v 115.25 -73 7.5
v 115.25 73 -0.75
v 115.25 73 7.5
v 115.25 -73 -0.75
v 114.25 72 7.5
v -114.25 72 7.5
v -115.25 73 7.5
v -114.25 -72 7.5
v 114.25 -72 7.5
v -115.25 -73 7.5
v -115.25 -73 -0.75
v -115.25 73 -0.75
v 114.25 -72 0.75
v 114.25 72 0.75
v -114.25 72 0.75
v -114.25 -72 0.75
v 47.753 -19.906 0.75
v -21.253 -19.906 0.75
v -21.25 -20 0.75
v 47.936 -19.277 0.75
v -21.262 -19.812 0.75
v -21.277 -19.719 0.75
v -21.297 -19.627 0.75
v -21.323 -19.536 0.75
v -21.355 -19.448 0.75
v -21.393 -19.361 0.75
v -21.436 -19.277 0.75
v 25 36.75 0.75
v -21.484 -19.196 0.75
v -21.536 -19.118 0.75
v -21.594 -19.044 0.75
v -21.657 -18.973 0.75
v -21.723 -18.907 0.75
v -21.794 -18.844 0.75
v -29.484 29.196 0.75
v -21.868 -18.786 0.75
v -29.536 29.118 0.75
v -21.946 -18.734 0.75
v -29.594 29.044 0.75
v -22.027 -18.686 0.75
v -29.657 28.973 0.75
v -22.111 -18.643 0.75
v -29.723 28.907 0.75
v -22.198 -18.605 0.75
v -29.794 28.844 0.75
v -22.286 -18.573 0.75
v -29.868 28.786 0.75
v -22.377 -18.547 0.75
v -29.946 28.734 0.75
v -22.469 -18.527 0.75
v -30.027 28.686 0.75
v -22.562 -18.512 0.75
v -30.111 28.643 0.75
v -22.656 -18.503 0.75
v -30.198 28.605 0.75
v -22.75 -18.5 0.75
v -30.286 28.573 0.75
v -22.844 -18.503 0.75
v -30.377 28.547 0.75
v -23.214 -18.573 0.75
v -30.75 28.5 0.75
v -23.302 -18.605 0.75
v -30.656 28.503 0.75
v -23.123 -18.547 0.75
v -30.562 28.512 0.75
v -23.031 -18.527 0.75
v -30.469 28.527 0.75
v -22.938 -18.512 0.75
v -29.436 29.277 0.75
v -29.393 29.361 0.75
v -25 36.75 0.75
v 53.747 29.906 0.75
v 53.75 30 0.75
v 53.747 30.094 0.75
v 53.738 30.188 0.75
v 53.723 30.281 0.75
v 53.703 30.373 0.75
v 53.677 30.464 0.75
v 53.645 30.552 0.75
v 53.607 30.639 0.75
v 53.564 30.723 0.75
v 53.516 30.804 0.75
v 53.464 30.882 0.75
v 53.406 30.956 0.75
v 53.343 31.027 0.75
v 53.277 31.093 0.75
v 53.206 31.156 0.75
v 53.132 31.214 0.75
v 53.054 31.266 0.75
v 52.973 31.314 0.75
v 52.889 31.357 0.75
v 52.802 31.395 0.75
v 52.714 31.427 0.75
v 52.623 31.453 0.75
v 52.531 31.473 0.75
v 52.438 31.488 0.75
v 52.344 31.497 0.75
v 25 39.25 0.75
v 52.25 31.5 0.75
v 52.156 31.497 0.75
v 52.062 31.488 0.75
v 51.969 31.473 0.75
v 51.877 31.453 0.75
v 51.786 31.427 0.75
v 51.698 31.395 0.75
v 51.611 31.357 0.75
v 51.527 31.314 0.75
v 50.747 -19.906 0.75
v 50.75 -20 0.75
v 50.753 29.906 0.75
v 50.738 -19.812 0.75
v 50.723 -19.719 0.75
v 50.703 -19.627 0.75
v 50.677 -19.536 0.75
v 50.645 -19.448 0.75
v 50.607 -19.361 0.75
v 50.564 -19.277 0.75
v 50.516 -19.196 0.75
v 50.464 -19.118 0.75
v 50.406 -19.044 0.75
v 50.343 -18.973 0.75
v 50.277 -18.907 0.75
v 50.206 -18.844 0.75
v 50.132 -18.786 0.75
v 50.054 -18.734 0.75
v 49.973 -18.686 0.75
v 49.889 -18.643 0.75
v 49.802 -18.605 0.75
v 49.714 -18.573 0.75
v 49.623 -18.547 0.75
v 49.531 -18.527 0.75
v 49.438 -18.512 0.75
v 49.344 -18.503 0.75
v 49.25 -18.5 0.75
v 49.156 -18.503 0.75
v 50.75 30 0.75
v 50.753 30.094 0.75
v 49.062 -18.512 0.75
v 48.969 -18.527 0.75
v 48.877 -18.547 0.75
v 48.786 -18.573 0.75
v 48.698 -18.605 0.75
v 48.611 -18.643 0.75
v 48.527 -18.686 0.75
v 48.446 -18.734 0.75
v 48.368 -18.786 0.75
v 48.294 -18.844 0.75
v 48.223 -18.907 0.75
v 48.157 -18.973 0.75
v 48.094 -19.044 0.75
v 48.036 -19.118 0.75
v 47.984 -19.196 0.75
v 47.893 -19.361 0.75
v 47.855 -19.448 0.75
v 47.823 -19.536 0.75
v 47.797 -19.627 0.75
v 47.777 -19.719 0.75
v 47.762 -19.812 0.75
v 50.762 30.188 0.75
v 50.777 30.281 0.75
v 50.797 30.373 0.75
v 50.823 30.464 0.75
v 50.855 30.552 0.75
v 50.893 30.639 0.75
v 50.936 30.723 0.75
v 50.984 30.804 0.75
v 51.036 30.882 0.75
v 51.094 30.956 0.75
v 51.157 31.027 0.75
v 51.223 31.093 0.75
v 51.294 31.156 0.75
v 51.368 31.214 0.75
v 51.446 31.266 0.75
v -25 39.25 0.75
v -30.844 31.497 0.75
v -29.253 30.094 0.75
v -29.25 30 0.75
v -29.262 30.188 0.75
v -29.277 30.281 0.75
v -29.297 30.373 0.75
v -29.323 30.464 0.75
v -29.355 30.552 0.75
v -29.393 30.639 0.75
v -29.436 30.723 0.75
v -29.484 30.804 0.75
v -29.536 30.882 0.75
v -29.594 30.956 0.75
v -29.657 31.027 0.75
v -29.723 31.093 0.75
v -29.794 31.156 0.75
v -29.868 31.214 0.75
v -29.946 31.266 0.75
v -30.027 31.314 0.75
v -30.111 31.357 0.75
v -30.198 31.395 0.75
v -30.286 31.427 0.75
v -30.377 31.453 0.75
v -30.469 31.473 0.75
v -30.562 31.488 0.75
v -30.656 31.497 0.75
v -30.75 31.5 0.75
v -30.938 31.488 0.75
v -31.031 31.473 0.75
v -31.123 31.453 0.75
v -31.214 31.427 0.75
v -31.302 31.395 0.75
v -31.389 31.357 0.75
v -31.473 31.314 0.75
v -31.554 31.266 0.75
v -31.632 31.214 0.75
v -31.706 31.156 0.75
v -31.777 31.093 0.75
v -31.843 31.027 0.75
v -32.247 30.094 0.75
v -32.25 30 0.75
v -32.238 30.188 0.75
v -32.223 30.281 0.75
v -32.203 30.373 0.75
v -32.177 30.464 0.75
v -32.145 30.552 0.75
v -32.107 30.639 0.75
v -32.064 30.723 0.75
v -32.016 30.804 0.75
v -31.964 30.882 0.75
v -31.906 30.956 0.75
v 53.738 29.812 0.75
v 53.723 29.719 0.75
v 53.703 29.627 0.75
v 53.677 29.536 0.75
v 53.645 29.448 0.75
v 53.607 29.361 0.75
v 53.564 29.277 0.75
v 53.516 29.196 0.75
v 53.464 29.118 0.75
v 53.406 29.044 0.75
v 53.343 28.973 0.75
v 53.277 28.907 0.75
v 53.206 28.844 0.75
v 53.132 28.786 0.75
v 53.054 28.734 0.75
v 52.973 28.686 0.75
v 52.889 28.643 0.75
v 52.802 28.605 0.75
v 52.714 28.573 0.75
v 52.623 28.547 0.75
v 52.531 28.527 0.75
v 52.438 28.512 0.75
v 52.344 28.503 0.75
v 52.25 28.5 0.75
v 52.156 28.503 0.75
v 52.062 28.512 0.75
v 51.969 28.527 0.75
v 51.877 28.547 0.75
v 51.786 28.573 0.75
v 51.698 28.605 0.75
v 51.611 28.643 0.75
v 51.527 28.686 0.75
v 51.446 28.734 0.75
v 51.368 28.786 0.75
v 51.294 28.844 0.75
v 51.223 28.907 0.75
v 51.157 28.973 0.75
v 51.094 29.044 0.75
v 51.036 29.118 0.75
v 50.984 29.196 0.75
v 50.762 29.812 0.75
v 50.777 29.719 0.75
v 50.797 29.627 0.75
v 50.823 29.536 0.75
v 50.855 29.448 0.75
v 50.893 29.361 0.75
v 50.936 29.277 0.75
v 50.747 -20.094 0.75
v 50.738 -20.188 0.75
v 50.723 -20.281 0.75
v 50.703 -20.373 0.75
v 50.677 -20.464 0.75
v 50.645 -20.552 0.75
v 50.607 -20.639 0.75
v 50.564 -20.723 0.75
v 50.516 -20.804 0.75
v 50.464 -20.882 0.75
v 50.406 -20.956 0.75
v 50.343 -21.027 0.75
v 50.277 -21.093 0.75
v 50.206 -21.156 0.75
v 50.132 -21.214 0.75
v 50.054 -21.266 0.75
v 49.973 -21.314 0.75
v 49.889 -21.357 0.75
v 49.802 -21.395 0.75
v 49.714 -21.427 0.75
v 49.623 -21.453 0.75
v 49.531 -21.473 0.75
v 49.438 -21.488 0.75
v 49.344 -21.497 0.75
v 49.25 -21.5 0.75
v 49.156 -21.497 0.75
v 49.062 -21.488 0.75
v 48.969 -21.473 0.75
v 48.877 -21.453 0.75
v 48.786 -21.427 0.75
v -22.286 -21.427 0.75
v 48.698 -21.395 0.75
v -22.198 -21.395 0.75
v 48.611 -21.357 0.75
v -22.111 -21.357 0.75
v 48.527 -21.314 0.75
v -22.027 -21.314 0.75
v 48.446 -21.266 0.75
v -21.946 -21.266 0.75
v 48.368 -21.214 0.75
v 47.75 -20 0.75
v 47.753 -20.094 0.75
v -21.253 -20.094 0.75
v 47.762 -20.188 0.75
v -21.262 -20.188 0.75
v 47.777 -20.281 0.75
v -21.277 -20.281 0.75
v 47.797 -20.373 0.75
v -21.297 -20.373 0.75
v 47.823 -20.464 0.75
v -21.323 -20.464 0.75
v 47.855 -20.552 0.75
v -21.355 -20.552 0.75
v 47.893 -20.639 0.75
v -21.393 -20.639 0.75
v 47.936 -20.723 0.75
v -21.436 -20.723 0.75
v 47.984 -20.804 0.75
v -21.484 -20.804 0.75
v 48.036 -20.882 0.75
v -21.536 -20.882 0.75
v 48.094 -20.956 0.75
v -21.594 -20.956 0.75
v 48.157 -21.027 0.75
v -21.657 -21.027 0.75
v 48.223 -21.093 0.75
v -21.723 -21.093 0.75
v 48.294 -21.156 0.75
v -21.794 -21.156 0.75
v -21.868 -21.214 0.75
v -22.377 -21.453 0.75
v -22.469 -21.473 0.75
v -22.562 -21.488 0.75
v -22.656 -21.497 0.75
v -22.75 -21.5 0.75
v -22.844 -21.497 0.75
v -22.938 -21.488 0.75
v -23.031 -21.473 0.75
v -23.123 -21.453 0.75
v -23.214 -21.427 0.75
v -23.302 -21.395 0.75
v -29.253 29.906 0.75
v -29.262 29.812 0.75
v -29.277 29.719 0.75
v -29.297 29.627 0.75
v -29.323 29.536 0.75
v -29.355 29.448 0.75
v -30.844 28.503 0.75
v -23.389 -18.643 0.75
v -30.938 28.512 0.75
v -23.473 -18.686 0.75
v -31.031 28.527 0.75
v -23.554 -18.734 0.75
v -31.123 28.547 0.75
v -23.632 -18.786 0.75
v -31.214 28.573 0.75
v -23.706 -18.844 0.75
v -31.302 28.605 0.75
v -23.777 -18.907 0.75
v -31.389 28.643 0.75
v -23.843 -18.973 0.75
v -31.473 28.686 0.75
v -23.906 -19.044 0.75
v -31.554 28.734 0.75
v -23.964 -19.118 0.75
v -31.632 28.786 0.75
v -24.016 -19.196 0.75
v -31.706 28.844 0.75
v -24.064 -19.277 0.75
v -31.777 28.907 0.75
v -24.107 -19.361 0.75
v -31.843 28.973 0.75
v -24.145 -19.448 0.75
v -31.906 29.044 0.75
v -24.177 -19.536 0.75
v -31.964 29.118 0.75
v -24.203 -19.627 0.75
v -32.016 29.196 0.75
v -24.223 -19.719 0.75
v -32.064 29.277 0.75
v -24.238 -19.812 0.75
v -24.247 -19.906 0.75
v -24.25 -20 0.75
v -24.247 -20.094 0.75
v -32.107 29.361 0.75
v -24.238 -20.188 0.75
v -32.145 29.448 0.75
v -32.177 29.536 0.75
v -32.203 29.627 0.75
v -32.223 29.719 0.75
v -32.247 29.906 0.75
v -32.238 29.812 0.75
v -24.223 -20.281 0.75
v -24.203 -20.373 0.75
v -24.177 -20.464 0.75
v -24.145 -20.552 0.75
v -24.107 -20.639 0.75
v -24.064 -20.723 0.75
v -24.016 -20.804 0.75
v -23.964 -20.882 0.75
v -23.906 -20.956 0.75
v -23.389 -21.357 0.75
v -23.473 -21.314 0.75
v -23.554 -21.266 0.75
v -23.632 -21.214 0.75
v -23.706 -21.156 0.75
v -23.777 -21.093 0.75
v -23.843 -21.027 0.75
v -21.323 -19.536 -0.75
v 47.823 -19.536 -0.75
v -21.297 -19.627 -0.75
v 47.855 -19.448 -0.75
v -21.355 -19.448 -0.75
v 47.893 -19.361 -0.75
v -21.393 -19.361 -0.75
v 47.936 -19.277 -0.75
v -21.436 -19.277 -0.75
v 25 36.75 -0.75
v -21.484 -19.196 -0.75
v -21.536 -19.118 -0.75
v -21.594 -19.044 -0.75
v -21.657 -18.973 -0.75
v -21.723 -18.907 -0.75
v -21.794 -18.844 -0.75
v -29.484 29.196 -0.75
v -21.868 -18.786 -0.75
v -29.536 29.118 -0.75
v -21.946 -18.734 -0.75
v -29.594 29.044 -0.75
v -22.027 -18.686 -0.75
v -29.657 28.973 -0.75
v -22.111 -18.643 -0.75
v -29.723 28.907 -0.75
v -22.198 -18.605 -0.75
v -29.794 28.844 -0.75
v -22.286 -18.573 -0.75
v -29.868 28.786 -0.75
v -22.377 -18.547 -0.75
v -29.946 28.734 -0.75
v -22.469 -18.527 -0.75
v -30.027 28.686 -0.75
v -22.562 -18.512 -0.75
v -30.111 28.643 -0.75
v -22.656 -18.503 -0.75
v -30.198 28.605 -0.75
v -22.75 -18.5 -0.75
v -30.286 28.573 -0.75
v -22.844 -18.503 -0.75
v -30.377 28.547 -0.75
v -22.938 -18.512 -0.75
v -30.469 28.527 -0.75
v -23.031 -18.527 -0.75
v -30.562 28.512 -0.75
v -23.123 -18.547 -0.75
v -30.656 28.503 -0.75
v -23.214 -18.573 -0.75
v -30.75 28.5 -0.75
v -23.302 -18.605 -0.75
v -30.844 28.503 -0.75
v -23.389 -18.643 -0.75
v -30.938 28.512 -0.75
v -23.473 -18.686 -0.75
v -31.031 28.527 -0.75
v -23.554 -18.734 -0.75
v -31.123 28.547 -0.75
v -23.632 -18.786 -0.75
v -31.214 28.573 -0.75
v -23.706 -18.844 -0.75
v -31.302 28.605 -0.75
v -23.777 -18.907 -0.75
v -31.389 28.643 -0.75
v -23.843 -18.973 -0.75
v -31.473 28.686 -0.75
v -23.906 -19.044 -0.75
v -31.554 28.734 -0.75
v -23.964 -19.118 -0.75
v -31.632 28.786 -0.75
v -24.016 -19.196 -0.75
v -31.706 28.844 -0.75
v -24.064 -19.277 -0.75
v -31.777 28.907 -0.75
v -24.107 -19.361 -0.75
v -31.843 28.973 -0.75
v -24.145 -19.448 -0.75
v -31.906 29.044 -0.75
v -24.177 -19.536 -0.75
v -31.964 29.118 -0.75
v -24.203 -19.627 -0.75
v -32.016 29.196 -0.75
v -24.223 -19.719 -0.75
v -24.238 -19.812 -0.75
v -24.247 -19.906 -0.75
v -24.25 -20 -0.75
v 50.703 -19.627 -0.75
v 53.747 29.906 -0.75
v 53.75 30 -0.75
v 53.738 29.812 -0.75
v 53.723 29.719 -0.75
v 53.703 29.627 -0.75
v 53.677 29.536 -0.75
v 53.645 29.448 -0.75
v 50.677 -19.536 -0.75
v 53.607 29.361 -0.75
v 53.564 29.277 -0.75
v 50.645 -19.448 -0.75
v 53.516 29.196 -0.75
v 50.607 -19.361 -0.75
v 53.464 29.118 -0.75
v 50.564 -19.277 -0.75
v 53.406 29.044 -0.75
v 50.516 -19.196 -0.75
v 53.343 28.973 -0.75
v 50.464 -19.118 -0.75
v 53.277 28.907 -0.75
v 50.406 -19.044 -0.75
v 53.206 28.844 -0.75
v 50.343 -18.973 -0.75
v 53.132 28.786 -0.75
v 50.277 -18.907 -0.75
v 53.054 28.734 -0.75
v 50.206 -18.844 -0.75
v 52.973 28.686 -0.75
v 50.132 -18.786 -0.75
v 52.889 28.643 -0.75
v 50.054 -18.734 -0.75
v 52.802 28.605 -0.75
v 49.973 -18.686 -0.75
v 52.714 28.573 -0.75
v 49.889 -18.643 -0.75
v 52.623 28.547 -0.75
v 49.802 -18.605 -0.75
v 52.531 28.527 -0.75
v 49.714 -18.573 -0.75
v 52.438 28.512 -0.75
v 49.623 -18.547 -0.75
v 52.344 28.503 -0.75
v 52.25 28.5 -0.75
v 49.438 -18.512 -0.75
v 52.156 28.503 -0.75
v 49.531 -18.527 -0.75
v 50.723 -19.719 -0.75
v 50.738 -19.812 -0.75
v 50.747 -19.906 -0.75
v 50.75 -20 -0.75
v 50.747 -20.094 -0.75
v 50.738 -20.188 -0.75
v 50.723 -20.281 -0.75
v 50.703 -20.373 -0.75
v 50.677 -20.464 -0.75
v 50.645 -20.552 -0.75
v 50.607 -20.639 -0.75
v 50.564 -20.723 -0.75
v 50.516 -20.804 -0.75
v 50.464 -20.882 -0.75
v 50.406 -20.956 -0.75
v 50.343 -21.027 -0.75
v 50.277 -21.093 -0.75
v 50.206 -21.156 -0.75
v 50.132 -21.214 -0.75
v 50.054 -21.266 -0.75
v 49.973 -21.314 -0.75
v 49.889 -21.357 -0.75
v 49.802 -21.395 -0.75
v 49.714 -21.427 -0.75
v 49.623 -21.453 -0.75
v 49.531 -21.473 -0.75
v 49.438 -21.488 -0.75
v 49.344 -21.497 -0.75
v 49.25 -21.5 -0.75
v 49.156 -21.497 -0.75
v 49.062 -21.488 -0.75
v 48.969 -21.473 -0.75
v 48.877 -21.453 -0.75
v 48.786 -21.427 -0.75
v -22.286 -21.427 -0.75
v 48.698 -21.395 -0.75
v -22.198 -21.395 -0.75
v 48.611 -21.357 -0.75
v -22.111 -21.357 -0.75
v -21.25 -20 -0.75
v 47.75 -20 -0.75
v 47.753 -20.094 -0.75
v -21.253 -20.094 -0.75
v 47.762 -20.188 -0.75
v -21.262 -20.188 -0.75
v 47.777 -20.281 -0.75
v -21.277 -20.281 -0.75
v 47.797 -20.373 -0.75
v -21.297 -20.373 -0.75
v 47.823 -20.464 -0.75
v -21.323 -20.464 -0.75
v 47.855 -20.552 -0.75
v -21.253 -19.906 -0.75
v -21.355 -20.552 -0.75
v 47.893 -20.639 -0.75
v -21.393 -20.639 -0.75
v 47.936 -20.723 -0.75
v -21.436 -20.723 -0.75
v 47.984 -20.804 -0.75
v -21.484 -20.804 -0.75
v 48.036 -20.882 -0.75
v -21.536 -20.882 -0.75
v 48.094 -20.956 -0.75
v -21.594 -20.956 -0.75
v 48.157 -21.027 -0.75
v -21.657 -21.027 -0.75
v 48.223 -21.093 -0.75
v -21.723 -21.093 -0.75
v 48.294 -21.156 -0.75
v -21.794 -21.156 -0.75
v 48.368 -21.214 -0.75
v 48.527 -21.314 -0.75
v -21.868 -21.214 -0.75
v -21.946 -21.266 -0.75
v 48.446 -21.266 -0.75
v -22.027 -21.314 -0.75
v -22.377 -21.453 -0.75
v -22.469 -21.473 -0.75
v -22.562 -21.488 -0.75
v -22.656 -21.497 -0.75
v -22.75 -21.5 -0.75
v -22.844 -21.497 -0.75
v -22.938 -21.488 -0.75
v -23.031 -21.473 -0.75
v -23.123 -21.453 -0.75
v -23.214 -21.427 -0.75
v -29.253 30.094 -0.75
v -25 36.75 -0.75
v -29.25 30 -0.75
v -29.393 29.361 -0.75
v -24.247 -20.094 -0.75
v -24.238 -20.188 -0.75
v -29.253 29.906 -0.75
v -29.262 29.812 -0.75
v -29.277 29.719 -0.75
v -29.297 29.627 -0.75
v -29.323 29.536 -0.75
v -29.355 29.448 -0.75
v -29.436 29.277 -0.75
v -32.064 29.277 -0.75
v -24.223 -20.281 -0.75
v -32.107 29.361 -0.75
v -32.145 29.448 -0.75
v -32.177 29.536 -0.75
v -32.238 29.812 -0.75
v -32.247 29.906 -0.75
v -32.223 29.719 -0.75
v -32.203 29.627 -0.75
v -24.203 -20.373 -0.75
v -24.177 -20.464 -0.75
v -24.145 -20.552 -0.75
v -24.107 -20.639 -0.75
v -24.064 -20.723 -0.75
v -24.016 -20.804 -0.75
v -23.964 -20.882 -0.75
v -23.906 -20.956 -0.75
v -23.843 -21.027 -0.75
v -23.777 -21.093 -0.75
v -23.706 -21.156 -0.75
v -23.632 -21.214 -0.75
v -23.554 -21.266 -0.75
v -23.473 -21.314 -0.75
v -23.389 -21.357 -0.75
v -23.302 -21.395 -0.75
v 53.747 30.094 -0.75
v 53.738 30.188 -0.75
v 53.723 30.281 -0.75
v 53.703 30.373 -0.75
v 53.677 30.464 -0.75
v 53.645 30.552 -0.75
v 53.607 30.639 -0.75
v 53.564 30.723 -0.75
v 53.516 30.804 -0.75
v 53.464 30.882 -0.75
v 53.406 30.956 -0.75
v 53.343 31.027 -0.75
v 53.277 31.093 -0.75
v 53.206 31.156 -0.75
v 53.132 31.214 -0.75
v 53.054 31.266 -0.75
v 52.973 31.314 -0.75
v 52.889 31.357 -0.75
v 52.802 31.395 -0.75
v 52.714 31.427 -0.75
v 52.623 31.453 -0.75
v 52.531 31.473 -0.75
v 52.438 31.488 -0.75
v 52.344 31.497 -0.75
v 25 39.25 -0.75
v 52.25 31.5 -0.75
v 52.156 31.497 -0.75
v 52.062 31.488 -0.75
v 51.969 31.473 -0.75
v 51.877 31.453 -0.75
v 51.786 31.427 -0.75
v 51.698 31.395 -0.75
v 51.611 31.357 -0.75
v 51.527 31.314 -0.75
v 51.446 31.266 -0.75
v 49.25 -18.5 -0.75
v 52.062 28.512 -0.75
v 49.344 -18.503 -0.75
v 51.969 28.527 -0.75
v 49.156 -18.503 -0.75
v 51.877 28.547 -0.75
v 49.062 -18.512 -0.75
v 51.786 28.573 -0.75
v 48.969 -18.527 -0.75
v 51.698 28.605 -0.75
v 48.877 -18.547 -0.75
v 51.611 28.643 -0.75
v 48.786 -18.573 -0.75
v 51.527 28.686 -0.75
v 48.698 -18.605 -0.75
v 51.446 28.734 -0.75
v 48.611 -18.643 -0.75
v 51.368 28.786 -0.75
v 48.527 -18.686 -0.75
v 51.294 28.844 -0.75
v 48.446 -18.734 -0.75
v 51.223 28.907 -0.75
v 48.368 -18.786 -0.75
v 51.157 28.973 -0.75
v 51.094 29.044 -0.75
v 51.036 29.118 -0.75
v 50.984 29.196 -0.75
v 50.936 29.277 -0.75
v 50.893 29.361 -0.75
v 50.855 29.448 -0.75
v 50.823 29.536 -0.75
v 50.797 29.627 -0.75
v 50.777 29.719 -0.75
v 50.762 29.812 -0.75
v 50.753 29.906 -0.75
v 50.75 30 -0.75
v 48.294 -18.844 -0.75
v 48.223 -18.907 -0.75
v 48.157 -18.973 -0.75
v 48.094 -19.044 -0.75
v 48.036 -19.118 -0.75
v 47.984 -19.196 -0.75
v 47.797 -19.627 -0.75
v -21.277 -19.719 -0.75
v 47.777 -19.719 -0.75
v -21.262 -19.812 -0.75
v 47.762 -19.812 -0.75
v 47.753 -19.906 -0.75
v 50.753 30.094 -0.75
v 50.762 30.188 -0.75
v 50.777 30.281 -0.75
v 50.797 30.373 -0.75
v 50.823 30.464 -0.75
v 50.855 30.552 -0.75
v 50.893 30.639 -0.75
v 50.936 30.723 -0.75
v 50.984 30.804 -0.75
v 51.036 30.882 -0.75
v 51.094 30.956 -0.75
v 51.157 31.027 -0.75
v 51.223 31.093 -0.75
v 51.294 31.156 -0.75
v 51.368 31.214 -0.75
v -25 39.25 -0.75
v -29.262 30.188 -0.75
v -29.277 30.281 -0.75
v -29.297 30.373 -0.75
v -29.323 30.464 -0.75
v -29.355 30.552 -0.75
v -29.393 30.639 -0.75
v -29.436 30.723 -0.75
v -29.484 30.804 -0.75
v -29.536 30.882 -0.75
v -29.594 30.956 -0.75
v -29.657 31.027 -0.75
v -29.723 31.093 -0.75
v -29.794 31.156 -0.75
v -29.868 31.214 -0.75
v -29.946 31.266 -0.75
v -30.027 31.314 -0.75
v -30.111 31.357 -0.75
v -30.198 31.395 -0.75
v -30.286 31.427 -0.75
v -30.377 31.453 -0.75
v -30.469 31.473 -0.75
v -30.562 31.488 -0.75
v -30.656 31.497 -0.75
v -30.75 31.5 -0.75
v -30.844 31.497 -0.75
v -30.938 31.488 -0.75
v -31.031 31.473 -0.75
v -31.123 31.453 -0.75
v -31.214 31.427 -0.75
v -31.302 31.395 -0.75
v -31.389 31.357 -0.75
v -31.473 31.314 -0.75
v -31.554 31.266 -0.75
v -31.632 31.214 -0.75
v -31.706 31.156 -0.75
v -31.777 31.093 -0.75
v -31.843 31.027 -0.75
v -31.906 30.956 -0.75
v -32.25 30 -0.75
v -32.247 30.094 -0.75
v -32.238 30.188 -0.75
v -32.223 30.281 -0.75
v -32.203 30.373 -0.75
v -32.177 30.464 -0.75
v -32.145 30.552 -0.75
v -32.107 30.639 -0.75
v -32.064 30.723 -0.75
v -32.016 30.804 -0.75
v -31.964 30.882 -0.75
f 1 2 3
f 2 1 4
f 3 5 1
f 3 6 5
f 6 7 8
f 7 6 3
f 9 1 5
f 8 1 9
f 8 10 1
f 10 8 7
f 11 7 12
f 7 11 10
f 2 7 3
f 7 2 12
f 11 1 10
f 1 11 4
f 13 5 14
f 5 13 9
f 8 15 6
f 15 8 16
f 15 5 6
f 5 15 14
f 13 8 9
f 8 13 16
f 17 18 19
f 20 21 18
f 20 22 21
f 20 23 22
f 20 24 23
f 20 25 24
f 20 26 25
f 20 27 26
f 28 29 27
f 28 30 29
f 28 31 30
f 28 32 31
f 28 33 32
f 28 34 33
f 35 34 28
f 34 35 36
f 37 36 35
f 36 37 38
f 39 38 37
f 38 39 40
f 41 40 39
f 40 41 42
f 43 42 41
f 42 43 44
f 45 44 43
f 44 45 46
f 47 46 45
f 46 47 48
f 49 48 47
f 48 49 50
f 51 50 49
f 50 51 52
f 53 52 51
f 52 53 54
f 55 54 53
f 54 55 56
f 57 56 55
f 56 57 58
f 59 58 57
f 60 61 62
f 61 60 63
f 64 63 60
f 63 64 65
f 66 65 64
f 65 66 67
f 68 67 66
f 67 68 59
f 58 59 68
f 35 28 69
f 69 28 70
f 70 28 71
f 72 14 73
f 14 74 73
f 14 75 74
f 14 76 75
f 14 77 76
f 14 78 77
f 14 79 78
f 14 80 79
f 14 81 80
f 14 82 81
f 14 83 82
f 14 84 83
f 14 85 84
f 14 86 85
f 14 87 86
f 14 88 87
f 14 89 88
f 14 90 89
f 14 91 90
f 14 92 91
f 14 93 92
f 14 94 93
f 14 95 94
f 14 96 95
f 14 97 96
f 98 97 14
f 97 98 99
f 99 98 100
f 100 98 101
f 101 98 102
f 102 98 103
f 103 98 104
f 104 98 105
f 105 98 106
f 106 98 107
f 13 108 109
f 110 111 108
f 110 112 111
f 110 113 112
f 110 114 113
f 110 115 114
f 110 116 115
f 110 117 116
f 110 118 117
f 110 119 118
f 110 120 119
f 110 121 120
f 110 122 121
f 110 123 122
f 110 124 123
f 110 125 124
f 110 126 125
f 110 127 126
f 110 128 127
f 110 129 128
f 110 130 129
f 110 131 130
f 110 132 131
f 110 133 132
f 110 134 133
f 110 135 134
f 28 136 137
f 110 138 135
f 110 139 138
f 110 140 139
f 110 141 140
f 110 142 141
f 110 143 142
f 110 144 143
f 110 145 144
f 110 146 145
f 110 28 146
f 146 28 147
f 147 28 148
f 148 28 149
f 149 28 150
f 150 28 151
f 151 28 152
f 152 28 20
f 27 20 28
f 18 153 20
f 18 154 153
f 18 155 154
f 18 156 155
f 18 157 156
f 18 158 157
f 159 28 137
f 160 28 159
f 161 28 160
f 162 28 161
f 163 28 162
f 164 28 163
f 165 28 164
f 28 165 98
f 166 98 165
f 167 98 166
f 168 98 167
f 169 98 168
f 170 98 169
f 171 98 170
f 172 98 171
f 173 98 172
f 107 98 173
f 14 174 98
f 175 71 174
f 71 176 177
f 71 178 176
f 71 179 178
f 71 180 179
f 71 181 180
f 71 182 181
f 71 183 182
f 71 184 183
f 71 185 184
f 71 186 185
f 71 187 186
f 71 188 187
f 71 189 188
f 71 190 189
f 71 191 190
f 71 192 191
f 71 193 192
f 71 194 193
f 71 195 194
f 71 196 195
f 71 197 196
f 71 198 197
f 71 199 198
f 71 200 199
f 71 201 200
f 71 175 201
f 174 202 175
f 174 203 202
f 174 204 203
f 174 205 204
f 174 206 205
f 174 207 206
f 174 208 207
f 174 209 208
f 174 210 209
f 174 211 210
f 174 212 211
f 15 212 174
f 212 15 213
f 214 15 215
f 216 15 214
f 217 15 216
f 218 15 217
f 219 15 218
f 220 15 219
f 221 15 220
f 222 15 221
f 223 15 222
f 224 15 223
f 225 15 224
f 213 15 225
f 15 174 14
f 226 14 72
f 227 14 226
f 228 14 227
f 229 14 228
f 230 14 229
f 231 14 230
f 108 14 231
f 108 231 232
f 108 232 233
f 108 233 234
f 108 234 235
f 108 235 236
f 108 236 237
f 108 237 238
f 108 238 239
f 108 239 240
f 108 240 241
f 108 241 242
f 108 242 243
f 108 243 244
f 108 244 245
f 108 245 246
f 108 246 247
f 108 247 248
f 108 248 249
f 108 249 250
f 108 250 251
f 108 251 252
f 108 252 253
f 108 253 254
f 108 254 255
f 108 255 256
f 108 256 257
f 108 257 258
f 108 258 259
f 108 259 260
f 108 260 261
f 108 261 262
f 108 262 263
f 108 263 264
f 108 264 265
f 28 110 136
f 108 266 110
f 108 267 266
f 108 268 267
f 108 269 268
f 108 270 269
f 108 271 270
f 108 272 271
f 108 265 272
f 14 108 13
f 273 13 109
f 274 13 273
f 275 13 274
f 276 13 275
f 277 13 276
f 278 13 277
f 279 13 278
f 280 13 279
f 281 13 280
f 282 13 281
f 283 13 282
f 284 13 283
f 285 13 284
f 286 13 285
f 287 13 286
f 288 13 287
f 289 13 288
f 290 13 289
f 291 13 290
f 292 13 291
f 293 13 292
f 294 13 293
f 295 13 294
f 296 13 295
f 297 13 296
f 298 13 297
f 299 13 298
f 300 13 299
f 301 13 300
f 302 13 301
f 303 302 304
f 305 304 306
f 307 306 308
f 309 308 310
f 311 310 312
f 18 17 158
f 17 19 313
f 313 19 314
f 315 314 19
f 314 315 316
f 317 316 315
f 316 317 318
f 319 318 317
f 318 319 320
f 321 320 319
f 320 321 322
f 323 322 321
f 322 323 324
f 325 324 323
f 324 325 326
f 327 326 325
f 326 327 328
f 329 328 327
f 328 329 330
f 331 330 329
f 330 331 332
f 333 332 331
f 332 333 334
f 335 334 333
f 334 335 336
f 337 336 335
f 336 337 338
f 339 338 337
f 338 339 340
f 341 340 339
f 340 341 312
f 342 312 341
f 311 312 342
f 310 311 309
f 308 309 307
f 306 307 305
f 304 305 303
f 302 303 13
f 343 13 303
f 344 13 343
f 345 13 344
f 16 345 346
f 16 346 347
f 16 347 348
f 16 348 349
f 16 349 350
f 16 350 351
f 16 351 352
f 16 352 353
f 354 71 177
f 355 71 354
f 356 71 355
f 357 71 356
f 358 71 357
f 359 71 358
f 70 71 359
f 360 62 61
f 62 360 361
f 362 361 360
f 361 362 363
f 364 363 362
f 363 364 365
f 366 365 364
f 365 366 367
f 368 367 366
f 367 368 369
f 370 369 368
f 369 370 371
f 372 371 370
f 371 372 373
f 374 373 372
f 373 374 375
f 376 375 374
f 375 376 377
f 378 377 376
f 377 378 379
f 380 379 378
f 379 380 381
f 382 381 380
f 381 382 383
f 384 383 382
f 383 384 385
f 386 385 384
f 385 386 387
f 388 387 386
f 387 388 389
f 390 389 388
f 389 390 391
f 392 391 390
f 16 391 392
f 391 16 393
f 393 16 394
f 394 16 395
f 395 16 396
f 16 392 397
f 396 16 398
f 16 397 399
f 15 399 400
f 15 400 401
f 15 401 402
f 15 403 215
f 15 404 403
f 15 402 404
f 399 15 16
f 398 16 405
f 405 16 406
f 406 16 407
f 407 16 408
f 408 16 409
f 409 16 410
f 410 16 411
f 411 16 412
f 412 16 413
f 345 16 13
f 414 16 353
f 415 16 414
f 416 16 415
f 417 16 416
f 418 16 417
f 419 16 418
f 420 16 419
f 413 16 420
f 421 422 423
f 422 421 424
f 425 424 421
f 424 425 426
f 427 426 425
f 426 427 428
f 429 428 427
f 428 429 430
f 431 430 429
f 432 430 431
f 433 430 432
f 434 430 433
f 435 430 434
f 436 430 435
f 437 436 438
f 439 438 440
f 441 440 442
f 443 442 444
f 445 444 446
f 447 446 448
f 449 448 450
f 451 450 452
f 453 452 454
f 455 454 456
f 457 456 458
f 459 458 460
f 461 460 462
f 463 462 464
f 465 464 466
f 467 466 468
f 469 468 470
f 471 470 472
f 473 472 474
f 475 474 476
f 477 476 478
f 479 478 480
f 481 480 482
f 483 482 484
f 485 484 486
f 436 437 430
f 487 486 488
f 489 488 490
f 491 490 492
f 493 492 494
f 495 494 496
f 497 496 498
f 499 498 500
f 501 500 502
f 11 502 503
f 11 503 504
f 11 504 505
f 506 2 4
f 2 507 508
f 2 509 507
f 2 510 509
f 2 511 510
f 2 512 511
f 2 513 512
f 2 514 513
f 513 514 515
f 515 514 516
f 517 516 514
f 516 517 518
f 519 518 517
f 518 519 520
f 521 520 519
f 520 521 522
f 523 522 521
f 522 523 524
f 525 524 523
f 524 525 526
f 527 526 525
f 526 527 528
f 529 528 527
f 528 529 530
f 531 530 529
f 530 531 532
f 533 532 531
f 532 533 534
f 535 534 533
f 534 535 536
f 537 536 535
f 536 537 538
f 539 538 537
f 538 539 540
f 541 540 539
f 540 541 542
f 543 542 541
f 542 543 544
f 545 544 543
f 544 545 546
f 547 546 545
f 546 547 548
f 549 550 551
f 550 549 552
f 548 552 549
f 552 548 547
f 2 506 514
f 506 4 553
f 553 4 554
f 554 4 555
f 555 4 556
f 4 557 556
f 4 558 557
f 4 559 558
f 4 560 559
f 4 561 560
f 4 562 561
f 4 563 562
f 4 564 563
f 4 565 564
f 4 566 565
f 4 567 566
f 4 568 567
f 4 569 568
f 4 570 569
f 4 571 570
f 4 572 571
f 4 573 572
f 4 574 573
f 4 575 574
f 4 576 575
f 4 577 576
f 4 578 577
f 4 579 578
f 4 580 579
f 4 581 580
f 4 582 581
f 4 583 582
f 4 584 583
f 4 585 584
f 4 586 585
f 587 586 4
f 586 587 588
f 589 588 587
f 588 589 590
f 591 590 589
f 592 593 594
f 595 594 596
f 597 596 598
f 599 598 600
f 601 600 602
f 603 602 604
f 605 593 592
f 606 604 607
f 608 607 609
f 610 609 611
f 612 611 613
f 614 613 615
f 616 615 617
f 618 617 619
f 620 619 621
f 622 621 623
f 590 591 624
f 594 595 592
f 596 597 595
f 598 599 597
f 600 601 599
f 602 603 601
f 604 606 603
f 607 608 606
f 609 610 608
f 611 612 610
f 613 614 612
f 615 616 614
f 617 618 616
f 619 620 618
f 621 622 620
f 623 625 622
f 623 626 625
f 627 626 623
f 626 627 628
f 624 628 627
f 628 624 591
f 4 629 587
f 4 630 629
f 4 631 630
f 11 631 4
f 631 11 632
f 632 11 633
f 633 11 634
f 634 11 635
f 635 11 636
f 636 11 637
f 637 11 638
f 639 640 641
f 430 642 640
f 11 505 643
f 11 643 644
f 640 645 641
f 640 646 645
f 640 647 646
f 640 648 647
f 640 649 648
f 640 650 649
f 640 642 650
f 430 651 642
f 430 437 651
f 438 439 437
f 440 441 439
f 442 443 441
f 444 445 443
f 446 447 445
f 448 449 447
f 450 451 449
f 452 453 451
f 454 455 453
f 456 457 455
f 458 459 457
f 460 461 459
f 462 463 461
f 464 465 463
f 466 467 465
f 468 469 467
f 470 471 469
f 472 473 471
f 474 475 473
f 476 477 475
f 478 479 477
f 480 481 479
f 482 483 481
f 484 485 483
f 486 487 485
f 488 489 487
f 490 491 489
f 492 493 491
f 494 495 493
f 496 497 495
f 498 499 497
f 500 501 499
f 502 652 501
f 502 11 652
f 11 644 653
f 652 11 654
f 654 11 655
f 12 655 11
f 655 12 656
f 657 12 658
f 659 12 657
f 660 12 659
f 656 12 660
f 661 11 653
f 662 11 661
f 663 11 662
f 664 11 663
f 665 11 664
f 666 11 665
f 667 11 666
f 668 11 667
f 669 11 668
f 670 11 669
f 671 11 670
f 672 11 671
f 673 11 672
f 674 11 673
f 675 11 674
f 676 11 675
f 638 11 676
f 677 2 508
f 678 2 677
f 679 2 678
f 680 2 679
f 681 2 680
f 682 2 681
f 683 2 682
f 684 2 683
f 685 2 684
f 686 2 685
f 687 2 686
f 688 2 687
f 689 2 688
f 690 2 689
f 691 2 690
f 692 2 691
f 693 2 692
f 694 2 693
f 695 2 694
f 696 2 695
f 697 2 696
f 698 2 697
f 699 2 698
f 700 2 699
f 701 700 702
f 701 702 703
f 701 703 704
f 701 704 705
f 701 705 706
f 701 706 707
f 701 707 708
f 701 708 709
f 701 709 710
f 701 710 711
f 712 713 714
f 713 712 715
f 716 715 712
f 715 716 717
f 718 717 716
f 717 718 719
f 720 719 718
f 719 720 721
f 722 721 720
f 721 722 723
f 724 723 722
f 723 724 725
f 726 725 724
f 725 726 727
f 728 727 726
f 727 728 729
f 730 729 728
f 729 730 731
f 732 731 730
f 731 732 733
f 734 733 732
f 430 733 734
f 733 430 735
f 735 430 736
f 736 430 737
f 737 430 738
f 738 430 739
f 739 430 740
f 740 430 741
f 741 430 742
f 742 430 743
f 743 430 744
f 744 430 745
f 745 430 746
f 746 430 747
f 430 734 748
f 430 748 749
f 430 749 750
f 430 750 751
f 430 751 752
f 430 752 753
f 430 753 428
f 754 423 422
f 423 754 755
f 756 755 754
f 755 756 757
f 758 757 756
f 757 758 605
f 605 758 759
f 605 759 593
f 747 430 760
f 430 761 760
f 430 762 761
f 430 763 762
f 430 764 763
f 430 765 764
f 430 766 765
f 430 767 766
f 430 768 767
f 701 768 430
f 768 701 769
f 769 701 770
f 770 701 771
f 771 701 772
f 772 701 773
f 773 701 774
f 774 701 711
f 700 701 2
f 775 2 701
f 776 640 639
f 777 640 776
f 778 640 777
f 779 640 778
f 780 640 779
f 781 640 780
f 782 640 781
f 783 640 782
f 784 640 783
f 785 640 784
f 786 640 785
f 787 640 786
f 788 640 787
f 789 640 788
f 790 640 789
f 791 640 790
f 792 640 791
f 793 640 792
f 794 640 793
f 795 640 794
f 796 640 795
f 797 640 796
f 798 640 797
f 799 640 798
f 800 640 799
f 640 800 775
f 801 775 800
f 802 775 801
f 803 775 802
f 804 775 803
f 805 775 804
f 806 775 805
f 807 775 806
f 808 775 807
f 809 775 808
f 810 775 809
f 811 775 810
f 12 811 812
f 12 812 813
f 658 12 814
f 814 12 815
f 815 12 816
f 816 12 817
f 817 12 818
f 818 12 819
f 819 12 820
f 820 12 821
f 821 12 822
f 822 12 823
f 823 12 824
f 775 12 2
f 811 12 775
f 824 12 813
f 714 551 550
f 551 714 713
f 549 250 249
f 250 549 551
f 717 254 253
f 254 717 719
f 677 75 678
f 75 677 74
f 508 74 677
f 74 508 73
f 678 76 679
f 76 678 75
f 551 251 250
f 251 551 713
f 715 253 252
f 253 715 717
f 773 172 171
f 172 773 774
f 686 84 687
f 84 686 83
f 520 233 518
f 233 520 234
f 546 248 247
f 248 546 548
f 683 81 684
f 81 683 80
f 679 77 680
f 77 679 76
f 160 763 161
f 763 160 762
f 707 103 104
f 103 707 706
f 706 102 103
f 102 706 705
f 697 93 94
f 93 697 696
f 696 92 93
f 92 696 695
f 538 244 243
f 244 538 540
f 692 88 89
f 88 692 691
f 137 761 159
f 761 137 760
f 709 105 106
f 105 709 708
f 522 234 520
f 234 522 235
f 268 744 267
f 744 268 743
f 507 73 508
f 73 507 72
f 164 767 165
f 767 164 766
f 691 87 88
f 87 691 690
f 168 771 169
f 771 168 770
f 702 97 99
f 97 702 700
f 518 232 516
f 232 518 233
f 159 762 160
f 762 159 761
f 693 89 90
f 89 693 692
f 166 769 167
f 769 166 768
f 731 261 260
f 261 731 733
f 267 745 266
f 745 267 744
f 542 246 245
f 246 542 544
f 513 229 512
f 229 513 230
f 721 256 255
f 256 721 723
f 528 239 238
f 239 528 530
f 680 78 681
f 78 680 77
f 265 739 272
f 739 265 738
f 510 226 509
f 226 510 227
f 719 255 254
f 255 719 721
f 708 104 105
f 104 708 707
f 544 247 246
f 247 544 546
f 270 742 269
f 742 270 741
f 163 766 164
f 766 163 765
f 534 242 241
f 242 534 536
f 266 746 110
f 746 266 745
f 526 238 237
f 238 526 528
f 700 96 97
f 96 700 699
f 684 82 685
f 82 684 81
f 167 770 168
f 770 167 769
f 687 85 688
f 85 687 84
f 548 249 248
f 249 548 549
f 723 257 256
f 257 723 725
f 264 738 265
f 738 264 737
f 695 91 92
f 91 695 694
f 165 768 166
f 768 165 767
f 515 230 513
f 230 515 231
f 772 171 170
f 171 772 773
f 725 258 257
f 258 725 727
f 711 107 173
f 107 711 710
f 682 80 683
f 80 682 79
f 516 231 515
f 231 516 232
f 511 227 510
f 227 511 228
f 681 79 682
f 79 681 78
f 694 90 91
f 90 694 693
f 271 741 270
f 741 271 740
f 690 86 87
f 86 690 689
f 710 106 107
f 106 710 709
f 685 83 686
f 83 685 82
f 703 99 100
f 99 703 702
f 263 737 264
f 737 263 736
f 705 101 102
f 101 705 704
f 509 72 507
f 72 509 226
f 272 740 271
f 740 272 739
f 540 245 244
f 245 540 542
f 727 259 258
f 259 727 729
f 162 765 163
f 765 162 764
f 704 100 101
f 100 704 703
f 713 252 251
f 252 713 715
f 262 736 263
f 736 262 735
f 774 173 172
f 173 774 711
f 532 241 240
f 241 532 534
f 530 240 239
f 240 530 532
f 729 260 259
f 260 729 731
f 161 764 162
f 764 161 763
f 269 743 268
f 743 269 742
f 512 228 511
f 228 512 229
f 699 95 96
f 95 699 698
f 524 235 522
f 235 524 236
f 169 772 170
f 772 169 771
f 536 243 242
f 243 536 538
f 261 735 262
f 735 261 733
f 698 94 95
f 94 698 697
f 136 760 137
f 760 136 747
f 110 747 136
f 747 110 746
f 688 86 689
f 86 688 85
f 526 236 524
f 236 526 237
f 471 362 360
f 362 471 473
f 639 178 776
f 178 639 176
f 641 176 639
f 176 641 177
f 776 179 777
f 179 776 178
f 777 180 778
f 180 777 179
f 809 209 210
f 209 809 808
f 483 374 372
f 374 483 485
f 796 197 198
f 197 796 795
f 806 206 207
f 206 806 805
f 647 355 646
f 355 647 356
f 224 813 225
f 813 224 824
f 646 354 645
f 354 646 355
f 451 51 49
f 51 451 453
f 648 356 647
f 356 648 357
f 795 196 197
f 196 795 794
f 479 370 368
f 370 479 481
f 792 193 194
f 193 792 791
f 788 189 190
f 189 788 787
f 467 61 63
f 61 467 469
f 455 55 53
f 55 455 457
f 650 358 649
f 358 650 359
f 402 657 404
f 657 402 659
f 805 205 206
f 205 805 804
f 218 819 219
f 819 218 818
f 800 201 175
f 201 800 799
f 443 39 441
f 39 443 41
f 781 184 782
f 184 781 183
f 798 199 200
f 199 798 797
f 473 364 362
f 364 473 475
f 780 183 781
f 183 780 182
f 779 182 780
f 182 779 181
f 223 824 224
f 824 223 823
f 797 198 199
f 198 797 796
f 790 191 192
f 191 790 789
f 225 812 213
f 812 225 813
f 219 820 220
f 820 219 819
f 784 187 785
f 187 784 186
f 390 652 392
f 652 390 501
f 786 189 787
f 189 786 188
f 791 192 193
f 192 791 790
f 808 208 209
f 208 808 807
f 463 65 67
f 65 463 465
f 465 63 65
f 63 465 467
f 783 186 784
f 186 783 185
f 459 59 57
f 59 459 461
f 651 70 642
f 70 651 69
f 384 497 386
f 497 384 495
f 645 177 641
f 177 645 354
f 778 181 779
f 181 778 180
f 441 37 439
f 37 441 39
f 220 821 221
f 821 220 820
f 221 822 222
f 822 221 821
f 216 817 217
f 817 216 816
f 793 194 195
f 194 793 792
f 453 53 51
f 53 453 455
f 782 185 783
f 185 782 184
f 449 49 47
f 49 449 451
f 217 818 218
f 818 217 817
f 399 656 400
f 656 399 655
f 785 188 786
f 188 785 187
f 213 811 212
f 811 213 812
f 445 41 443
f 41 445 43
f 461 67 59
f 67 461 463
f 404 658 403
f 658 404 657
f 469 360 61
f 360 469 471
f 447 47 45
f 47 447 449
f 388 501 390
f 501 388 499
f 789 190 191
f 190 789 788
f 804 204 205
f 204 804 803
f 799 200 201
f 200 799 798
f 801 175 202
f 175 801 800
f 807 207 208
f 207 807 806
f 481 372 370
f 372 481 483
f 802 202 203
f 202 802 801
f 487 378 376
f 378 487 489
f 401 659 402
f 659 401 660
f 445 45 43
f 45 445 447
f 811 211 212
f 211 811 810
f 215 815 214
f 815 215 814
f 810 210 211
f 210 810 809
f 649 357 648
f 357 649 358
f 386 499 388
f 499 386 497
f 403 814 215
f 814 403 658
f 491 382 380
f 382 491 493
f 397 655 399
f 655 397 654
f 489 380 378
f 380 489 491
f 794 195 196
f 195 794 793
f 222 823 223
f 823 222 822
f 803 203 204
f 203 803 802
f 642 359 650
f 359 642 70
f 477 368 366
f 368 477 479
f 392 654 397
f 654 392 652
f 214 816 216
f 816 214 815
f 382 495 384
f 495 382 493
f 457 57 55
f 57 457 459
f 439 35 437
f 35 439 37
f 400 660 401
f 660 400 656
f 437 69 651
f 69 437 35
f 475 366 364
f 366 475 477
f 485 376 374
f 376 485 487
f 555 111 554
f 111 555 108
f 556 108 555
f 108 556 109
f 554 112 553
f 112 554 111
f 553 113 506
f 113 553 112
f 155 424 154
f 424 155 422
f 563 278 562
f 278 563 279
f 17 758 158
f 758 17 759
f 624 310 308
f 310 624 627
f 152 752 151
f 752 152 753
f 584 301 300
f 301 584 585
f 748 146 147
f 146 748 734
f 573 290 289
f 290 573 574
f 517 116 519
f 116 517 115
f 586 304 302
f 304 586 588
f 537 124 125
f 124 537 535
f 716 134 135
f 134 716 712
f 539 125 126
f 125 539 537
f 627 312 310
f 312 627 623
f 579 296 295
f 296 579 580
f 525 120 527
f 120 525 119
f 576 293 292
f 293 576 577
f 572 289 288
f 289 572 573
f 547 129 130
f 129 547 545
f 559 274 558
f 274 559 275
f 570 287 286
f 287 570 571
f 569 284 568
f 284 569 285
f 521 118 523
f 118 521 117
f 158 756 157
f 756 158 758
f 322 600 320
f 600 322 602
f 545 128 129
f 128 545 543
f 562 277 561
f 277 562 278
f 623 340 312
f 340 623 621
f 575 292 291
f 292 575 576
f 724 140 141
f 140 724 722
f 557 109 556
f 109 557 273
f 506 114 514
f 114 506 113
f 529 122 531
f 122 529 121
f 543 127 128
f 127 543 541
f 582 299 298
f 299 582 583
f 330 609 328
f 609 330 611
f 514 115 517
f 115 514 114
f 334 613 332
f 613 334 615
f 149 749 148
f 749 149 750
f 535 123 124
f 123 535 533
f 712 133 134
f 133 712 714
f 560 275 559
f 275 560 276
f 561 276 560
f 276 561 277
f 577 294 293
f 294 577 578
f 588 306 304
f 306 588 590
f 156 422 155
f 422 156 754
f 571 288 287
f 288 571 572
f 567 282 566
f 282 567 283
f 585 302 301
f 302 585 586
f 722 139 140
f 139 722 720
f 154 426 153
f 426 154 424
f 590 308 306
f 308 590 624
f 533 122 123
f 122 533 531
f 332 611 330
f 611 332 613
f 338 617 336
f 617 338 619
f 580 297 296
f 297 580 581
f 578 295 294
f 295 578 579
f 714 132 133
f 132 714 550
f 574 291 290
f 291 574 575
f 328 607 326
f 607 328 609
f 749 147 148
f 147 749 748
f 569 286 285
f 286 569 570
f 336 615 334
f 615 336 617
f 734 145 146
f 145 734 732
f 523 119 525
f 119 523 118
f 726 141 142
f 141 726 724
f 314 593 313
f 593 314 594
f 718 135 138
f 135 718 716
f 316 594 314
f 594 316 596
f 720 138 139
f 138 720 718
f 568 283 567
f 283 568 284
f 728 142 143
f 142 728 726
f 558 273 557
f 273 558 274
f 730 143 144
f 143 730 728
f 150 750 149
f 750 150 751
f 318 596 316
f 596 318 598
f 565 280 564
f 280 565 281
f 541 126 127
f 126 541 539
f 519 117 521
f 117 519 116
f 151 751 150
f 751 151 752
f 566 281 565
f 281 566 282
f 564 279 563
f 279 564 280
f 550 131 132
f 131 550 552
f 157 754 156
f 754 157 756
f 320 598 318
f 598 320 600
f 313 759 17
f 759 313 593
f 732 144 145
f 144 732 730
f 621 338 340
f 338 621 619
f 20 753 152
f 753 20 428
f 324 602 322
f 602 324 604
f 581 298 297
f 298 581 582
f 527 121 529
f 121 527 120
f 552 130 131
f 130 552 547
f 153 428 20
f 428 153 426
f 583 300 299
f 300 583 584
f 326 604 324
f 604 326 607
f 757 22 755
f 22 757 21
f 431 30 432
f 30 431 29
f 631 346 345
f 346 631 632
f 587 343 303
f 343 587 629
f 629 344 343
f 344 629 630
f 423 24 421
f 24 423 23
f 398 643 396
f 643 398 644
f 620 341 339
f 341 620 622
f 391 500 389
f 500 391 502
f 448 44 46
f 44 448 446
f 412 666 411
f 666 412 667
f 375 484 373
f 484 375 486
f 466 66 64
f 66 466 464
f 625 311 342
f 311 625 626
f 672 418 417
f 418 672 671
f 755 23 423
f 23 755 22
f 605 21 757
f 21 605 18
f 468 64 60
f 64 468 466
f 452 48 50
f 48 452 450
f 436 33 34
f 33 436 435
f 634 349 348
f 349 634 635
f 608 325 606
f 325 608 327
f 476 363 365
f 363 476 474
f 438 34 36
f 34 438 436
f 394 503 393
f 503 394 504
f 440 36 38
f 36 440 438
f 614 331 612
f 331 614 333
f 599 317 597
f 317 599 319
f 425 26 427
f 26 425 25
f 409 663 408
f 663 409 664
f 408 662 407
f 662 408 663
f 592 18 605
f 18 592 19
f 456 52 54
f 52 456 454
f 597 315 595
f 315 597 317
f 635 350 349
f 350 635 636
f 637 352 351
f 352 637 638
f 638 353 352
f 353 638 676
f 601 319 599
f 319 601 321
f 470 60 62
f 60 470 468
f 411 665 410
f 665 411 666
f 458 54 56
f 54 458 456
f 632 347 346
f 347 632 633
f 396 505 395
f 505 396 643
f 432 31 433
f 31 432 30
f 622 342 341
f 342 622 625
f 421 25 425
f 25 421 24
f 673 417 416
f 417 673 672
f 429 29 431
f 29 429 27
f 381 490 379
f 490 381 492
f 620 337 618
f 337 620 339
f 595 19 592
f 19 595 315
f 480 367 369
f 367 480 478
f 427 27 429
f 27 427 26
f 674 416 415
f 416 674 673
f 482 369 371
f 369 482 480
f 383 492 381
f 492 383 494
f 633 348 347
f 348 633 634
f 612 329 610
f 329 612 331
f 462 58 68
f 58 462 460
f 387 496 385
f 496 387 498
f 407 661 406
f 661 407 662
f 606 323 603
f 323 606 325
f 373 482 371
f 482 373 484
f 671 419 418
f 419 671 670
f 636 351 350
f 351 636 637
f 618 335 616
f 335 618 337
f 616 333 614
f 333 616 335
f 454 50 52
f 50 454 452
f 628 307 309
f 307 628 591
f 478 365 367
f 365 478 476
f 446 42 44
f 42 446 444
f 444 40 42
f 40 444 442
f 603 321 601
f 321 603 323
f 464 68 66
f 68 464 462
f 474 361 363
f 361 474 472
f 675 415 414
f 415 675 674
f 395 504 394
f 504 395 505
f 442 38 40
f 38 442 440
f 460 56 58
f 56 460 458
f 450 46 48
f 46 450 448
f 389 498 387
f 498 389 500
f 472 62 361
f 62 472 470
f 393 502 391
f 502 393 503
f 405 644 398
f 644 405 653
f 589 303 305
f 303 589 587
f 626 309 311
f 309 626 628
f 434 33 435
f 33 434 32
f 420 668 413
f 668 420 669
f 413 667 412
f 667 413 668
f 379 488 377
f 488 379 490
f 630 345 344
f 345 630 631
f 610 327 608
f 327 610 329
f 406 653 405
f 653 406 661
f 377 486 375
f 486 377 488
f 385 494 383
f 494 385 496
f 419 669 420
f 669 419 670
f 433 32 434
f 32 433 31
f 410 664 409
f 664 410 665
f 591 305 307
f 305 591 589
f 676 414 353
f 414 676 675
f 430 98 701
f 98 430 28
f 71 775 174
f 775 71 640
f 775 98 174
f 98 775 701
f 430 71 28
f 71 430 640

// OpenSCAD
lcd_width=210.5;                    //Overall LCD Panel Width
lcd_height=126;                     //Overall LCD Panel Height
lcd_depth=3;                        //Overall height of the LCD Panel
lcd_viewport_width=201;             //Width of viewable screen
lcd_viewport_height=114;            //Height of viewable screen
lcd_surround_width=20;              //Total Width of Surround 
lcd_left_margin=3.5;                //Width of the margin on the left of the LCD Panel
lcd_right_margin=6;                 //Width of the margin on the right side of the LCD Panel
lcd_top_margin=3;                   //Width of top margin of the LCD Panel
lcd_bottom_margin=8.5;              //Width of bottom margin of the LCD Panel
wall_thickness=2;
lcd_cable_width=40;

outside_width=lcd_width + lcd_surround_width;
outside_height=lcd_height + lcd_surround_width;


module back()
{
    //Main surface

    cube([outside_width, outside_height, 1.5], true);
    
    //Box Lip
    difference() {
        translate([0,0,wall_thickness+1.5])
        cube([outside_width, outside_height, 8], true);
        translate([0,0,0])
        cube([outside_width-(wall_thickness), outside_height-(wall_thickness), 20], true);
    }
    
}

module mounting_holes() {
    //bottom right
    translate([(outside_width/2)-63,(outside_height/2)-43,-5])
        cylinder(10,d=3, $fn=100);
    //bottom left
    translate([(outside_width/2)-146,(outside_height/2)-43,-5])
        cylinder(10,d=3, $fn=100);
    //top right
    translate([((outside_width/2)-66),((outside_height/2)-43)-50,-5])
        cylinder(10,d=3, $fn=100);
    //top left
    translate([(outside_width/2)-138,((outside_height/2)-43)-50,-5])
        cylinder(10,d=3, $fn=100);            
}

    //Slot for LCD cable
    difference() {
        back();
        translate([0,(outside_height/2)-35,0])
            cube([50,2.5,40], true);
        mounting_holes();
    }
